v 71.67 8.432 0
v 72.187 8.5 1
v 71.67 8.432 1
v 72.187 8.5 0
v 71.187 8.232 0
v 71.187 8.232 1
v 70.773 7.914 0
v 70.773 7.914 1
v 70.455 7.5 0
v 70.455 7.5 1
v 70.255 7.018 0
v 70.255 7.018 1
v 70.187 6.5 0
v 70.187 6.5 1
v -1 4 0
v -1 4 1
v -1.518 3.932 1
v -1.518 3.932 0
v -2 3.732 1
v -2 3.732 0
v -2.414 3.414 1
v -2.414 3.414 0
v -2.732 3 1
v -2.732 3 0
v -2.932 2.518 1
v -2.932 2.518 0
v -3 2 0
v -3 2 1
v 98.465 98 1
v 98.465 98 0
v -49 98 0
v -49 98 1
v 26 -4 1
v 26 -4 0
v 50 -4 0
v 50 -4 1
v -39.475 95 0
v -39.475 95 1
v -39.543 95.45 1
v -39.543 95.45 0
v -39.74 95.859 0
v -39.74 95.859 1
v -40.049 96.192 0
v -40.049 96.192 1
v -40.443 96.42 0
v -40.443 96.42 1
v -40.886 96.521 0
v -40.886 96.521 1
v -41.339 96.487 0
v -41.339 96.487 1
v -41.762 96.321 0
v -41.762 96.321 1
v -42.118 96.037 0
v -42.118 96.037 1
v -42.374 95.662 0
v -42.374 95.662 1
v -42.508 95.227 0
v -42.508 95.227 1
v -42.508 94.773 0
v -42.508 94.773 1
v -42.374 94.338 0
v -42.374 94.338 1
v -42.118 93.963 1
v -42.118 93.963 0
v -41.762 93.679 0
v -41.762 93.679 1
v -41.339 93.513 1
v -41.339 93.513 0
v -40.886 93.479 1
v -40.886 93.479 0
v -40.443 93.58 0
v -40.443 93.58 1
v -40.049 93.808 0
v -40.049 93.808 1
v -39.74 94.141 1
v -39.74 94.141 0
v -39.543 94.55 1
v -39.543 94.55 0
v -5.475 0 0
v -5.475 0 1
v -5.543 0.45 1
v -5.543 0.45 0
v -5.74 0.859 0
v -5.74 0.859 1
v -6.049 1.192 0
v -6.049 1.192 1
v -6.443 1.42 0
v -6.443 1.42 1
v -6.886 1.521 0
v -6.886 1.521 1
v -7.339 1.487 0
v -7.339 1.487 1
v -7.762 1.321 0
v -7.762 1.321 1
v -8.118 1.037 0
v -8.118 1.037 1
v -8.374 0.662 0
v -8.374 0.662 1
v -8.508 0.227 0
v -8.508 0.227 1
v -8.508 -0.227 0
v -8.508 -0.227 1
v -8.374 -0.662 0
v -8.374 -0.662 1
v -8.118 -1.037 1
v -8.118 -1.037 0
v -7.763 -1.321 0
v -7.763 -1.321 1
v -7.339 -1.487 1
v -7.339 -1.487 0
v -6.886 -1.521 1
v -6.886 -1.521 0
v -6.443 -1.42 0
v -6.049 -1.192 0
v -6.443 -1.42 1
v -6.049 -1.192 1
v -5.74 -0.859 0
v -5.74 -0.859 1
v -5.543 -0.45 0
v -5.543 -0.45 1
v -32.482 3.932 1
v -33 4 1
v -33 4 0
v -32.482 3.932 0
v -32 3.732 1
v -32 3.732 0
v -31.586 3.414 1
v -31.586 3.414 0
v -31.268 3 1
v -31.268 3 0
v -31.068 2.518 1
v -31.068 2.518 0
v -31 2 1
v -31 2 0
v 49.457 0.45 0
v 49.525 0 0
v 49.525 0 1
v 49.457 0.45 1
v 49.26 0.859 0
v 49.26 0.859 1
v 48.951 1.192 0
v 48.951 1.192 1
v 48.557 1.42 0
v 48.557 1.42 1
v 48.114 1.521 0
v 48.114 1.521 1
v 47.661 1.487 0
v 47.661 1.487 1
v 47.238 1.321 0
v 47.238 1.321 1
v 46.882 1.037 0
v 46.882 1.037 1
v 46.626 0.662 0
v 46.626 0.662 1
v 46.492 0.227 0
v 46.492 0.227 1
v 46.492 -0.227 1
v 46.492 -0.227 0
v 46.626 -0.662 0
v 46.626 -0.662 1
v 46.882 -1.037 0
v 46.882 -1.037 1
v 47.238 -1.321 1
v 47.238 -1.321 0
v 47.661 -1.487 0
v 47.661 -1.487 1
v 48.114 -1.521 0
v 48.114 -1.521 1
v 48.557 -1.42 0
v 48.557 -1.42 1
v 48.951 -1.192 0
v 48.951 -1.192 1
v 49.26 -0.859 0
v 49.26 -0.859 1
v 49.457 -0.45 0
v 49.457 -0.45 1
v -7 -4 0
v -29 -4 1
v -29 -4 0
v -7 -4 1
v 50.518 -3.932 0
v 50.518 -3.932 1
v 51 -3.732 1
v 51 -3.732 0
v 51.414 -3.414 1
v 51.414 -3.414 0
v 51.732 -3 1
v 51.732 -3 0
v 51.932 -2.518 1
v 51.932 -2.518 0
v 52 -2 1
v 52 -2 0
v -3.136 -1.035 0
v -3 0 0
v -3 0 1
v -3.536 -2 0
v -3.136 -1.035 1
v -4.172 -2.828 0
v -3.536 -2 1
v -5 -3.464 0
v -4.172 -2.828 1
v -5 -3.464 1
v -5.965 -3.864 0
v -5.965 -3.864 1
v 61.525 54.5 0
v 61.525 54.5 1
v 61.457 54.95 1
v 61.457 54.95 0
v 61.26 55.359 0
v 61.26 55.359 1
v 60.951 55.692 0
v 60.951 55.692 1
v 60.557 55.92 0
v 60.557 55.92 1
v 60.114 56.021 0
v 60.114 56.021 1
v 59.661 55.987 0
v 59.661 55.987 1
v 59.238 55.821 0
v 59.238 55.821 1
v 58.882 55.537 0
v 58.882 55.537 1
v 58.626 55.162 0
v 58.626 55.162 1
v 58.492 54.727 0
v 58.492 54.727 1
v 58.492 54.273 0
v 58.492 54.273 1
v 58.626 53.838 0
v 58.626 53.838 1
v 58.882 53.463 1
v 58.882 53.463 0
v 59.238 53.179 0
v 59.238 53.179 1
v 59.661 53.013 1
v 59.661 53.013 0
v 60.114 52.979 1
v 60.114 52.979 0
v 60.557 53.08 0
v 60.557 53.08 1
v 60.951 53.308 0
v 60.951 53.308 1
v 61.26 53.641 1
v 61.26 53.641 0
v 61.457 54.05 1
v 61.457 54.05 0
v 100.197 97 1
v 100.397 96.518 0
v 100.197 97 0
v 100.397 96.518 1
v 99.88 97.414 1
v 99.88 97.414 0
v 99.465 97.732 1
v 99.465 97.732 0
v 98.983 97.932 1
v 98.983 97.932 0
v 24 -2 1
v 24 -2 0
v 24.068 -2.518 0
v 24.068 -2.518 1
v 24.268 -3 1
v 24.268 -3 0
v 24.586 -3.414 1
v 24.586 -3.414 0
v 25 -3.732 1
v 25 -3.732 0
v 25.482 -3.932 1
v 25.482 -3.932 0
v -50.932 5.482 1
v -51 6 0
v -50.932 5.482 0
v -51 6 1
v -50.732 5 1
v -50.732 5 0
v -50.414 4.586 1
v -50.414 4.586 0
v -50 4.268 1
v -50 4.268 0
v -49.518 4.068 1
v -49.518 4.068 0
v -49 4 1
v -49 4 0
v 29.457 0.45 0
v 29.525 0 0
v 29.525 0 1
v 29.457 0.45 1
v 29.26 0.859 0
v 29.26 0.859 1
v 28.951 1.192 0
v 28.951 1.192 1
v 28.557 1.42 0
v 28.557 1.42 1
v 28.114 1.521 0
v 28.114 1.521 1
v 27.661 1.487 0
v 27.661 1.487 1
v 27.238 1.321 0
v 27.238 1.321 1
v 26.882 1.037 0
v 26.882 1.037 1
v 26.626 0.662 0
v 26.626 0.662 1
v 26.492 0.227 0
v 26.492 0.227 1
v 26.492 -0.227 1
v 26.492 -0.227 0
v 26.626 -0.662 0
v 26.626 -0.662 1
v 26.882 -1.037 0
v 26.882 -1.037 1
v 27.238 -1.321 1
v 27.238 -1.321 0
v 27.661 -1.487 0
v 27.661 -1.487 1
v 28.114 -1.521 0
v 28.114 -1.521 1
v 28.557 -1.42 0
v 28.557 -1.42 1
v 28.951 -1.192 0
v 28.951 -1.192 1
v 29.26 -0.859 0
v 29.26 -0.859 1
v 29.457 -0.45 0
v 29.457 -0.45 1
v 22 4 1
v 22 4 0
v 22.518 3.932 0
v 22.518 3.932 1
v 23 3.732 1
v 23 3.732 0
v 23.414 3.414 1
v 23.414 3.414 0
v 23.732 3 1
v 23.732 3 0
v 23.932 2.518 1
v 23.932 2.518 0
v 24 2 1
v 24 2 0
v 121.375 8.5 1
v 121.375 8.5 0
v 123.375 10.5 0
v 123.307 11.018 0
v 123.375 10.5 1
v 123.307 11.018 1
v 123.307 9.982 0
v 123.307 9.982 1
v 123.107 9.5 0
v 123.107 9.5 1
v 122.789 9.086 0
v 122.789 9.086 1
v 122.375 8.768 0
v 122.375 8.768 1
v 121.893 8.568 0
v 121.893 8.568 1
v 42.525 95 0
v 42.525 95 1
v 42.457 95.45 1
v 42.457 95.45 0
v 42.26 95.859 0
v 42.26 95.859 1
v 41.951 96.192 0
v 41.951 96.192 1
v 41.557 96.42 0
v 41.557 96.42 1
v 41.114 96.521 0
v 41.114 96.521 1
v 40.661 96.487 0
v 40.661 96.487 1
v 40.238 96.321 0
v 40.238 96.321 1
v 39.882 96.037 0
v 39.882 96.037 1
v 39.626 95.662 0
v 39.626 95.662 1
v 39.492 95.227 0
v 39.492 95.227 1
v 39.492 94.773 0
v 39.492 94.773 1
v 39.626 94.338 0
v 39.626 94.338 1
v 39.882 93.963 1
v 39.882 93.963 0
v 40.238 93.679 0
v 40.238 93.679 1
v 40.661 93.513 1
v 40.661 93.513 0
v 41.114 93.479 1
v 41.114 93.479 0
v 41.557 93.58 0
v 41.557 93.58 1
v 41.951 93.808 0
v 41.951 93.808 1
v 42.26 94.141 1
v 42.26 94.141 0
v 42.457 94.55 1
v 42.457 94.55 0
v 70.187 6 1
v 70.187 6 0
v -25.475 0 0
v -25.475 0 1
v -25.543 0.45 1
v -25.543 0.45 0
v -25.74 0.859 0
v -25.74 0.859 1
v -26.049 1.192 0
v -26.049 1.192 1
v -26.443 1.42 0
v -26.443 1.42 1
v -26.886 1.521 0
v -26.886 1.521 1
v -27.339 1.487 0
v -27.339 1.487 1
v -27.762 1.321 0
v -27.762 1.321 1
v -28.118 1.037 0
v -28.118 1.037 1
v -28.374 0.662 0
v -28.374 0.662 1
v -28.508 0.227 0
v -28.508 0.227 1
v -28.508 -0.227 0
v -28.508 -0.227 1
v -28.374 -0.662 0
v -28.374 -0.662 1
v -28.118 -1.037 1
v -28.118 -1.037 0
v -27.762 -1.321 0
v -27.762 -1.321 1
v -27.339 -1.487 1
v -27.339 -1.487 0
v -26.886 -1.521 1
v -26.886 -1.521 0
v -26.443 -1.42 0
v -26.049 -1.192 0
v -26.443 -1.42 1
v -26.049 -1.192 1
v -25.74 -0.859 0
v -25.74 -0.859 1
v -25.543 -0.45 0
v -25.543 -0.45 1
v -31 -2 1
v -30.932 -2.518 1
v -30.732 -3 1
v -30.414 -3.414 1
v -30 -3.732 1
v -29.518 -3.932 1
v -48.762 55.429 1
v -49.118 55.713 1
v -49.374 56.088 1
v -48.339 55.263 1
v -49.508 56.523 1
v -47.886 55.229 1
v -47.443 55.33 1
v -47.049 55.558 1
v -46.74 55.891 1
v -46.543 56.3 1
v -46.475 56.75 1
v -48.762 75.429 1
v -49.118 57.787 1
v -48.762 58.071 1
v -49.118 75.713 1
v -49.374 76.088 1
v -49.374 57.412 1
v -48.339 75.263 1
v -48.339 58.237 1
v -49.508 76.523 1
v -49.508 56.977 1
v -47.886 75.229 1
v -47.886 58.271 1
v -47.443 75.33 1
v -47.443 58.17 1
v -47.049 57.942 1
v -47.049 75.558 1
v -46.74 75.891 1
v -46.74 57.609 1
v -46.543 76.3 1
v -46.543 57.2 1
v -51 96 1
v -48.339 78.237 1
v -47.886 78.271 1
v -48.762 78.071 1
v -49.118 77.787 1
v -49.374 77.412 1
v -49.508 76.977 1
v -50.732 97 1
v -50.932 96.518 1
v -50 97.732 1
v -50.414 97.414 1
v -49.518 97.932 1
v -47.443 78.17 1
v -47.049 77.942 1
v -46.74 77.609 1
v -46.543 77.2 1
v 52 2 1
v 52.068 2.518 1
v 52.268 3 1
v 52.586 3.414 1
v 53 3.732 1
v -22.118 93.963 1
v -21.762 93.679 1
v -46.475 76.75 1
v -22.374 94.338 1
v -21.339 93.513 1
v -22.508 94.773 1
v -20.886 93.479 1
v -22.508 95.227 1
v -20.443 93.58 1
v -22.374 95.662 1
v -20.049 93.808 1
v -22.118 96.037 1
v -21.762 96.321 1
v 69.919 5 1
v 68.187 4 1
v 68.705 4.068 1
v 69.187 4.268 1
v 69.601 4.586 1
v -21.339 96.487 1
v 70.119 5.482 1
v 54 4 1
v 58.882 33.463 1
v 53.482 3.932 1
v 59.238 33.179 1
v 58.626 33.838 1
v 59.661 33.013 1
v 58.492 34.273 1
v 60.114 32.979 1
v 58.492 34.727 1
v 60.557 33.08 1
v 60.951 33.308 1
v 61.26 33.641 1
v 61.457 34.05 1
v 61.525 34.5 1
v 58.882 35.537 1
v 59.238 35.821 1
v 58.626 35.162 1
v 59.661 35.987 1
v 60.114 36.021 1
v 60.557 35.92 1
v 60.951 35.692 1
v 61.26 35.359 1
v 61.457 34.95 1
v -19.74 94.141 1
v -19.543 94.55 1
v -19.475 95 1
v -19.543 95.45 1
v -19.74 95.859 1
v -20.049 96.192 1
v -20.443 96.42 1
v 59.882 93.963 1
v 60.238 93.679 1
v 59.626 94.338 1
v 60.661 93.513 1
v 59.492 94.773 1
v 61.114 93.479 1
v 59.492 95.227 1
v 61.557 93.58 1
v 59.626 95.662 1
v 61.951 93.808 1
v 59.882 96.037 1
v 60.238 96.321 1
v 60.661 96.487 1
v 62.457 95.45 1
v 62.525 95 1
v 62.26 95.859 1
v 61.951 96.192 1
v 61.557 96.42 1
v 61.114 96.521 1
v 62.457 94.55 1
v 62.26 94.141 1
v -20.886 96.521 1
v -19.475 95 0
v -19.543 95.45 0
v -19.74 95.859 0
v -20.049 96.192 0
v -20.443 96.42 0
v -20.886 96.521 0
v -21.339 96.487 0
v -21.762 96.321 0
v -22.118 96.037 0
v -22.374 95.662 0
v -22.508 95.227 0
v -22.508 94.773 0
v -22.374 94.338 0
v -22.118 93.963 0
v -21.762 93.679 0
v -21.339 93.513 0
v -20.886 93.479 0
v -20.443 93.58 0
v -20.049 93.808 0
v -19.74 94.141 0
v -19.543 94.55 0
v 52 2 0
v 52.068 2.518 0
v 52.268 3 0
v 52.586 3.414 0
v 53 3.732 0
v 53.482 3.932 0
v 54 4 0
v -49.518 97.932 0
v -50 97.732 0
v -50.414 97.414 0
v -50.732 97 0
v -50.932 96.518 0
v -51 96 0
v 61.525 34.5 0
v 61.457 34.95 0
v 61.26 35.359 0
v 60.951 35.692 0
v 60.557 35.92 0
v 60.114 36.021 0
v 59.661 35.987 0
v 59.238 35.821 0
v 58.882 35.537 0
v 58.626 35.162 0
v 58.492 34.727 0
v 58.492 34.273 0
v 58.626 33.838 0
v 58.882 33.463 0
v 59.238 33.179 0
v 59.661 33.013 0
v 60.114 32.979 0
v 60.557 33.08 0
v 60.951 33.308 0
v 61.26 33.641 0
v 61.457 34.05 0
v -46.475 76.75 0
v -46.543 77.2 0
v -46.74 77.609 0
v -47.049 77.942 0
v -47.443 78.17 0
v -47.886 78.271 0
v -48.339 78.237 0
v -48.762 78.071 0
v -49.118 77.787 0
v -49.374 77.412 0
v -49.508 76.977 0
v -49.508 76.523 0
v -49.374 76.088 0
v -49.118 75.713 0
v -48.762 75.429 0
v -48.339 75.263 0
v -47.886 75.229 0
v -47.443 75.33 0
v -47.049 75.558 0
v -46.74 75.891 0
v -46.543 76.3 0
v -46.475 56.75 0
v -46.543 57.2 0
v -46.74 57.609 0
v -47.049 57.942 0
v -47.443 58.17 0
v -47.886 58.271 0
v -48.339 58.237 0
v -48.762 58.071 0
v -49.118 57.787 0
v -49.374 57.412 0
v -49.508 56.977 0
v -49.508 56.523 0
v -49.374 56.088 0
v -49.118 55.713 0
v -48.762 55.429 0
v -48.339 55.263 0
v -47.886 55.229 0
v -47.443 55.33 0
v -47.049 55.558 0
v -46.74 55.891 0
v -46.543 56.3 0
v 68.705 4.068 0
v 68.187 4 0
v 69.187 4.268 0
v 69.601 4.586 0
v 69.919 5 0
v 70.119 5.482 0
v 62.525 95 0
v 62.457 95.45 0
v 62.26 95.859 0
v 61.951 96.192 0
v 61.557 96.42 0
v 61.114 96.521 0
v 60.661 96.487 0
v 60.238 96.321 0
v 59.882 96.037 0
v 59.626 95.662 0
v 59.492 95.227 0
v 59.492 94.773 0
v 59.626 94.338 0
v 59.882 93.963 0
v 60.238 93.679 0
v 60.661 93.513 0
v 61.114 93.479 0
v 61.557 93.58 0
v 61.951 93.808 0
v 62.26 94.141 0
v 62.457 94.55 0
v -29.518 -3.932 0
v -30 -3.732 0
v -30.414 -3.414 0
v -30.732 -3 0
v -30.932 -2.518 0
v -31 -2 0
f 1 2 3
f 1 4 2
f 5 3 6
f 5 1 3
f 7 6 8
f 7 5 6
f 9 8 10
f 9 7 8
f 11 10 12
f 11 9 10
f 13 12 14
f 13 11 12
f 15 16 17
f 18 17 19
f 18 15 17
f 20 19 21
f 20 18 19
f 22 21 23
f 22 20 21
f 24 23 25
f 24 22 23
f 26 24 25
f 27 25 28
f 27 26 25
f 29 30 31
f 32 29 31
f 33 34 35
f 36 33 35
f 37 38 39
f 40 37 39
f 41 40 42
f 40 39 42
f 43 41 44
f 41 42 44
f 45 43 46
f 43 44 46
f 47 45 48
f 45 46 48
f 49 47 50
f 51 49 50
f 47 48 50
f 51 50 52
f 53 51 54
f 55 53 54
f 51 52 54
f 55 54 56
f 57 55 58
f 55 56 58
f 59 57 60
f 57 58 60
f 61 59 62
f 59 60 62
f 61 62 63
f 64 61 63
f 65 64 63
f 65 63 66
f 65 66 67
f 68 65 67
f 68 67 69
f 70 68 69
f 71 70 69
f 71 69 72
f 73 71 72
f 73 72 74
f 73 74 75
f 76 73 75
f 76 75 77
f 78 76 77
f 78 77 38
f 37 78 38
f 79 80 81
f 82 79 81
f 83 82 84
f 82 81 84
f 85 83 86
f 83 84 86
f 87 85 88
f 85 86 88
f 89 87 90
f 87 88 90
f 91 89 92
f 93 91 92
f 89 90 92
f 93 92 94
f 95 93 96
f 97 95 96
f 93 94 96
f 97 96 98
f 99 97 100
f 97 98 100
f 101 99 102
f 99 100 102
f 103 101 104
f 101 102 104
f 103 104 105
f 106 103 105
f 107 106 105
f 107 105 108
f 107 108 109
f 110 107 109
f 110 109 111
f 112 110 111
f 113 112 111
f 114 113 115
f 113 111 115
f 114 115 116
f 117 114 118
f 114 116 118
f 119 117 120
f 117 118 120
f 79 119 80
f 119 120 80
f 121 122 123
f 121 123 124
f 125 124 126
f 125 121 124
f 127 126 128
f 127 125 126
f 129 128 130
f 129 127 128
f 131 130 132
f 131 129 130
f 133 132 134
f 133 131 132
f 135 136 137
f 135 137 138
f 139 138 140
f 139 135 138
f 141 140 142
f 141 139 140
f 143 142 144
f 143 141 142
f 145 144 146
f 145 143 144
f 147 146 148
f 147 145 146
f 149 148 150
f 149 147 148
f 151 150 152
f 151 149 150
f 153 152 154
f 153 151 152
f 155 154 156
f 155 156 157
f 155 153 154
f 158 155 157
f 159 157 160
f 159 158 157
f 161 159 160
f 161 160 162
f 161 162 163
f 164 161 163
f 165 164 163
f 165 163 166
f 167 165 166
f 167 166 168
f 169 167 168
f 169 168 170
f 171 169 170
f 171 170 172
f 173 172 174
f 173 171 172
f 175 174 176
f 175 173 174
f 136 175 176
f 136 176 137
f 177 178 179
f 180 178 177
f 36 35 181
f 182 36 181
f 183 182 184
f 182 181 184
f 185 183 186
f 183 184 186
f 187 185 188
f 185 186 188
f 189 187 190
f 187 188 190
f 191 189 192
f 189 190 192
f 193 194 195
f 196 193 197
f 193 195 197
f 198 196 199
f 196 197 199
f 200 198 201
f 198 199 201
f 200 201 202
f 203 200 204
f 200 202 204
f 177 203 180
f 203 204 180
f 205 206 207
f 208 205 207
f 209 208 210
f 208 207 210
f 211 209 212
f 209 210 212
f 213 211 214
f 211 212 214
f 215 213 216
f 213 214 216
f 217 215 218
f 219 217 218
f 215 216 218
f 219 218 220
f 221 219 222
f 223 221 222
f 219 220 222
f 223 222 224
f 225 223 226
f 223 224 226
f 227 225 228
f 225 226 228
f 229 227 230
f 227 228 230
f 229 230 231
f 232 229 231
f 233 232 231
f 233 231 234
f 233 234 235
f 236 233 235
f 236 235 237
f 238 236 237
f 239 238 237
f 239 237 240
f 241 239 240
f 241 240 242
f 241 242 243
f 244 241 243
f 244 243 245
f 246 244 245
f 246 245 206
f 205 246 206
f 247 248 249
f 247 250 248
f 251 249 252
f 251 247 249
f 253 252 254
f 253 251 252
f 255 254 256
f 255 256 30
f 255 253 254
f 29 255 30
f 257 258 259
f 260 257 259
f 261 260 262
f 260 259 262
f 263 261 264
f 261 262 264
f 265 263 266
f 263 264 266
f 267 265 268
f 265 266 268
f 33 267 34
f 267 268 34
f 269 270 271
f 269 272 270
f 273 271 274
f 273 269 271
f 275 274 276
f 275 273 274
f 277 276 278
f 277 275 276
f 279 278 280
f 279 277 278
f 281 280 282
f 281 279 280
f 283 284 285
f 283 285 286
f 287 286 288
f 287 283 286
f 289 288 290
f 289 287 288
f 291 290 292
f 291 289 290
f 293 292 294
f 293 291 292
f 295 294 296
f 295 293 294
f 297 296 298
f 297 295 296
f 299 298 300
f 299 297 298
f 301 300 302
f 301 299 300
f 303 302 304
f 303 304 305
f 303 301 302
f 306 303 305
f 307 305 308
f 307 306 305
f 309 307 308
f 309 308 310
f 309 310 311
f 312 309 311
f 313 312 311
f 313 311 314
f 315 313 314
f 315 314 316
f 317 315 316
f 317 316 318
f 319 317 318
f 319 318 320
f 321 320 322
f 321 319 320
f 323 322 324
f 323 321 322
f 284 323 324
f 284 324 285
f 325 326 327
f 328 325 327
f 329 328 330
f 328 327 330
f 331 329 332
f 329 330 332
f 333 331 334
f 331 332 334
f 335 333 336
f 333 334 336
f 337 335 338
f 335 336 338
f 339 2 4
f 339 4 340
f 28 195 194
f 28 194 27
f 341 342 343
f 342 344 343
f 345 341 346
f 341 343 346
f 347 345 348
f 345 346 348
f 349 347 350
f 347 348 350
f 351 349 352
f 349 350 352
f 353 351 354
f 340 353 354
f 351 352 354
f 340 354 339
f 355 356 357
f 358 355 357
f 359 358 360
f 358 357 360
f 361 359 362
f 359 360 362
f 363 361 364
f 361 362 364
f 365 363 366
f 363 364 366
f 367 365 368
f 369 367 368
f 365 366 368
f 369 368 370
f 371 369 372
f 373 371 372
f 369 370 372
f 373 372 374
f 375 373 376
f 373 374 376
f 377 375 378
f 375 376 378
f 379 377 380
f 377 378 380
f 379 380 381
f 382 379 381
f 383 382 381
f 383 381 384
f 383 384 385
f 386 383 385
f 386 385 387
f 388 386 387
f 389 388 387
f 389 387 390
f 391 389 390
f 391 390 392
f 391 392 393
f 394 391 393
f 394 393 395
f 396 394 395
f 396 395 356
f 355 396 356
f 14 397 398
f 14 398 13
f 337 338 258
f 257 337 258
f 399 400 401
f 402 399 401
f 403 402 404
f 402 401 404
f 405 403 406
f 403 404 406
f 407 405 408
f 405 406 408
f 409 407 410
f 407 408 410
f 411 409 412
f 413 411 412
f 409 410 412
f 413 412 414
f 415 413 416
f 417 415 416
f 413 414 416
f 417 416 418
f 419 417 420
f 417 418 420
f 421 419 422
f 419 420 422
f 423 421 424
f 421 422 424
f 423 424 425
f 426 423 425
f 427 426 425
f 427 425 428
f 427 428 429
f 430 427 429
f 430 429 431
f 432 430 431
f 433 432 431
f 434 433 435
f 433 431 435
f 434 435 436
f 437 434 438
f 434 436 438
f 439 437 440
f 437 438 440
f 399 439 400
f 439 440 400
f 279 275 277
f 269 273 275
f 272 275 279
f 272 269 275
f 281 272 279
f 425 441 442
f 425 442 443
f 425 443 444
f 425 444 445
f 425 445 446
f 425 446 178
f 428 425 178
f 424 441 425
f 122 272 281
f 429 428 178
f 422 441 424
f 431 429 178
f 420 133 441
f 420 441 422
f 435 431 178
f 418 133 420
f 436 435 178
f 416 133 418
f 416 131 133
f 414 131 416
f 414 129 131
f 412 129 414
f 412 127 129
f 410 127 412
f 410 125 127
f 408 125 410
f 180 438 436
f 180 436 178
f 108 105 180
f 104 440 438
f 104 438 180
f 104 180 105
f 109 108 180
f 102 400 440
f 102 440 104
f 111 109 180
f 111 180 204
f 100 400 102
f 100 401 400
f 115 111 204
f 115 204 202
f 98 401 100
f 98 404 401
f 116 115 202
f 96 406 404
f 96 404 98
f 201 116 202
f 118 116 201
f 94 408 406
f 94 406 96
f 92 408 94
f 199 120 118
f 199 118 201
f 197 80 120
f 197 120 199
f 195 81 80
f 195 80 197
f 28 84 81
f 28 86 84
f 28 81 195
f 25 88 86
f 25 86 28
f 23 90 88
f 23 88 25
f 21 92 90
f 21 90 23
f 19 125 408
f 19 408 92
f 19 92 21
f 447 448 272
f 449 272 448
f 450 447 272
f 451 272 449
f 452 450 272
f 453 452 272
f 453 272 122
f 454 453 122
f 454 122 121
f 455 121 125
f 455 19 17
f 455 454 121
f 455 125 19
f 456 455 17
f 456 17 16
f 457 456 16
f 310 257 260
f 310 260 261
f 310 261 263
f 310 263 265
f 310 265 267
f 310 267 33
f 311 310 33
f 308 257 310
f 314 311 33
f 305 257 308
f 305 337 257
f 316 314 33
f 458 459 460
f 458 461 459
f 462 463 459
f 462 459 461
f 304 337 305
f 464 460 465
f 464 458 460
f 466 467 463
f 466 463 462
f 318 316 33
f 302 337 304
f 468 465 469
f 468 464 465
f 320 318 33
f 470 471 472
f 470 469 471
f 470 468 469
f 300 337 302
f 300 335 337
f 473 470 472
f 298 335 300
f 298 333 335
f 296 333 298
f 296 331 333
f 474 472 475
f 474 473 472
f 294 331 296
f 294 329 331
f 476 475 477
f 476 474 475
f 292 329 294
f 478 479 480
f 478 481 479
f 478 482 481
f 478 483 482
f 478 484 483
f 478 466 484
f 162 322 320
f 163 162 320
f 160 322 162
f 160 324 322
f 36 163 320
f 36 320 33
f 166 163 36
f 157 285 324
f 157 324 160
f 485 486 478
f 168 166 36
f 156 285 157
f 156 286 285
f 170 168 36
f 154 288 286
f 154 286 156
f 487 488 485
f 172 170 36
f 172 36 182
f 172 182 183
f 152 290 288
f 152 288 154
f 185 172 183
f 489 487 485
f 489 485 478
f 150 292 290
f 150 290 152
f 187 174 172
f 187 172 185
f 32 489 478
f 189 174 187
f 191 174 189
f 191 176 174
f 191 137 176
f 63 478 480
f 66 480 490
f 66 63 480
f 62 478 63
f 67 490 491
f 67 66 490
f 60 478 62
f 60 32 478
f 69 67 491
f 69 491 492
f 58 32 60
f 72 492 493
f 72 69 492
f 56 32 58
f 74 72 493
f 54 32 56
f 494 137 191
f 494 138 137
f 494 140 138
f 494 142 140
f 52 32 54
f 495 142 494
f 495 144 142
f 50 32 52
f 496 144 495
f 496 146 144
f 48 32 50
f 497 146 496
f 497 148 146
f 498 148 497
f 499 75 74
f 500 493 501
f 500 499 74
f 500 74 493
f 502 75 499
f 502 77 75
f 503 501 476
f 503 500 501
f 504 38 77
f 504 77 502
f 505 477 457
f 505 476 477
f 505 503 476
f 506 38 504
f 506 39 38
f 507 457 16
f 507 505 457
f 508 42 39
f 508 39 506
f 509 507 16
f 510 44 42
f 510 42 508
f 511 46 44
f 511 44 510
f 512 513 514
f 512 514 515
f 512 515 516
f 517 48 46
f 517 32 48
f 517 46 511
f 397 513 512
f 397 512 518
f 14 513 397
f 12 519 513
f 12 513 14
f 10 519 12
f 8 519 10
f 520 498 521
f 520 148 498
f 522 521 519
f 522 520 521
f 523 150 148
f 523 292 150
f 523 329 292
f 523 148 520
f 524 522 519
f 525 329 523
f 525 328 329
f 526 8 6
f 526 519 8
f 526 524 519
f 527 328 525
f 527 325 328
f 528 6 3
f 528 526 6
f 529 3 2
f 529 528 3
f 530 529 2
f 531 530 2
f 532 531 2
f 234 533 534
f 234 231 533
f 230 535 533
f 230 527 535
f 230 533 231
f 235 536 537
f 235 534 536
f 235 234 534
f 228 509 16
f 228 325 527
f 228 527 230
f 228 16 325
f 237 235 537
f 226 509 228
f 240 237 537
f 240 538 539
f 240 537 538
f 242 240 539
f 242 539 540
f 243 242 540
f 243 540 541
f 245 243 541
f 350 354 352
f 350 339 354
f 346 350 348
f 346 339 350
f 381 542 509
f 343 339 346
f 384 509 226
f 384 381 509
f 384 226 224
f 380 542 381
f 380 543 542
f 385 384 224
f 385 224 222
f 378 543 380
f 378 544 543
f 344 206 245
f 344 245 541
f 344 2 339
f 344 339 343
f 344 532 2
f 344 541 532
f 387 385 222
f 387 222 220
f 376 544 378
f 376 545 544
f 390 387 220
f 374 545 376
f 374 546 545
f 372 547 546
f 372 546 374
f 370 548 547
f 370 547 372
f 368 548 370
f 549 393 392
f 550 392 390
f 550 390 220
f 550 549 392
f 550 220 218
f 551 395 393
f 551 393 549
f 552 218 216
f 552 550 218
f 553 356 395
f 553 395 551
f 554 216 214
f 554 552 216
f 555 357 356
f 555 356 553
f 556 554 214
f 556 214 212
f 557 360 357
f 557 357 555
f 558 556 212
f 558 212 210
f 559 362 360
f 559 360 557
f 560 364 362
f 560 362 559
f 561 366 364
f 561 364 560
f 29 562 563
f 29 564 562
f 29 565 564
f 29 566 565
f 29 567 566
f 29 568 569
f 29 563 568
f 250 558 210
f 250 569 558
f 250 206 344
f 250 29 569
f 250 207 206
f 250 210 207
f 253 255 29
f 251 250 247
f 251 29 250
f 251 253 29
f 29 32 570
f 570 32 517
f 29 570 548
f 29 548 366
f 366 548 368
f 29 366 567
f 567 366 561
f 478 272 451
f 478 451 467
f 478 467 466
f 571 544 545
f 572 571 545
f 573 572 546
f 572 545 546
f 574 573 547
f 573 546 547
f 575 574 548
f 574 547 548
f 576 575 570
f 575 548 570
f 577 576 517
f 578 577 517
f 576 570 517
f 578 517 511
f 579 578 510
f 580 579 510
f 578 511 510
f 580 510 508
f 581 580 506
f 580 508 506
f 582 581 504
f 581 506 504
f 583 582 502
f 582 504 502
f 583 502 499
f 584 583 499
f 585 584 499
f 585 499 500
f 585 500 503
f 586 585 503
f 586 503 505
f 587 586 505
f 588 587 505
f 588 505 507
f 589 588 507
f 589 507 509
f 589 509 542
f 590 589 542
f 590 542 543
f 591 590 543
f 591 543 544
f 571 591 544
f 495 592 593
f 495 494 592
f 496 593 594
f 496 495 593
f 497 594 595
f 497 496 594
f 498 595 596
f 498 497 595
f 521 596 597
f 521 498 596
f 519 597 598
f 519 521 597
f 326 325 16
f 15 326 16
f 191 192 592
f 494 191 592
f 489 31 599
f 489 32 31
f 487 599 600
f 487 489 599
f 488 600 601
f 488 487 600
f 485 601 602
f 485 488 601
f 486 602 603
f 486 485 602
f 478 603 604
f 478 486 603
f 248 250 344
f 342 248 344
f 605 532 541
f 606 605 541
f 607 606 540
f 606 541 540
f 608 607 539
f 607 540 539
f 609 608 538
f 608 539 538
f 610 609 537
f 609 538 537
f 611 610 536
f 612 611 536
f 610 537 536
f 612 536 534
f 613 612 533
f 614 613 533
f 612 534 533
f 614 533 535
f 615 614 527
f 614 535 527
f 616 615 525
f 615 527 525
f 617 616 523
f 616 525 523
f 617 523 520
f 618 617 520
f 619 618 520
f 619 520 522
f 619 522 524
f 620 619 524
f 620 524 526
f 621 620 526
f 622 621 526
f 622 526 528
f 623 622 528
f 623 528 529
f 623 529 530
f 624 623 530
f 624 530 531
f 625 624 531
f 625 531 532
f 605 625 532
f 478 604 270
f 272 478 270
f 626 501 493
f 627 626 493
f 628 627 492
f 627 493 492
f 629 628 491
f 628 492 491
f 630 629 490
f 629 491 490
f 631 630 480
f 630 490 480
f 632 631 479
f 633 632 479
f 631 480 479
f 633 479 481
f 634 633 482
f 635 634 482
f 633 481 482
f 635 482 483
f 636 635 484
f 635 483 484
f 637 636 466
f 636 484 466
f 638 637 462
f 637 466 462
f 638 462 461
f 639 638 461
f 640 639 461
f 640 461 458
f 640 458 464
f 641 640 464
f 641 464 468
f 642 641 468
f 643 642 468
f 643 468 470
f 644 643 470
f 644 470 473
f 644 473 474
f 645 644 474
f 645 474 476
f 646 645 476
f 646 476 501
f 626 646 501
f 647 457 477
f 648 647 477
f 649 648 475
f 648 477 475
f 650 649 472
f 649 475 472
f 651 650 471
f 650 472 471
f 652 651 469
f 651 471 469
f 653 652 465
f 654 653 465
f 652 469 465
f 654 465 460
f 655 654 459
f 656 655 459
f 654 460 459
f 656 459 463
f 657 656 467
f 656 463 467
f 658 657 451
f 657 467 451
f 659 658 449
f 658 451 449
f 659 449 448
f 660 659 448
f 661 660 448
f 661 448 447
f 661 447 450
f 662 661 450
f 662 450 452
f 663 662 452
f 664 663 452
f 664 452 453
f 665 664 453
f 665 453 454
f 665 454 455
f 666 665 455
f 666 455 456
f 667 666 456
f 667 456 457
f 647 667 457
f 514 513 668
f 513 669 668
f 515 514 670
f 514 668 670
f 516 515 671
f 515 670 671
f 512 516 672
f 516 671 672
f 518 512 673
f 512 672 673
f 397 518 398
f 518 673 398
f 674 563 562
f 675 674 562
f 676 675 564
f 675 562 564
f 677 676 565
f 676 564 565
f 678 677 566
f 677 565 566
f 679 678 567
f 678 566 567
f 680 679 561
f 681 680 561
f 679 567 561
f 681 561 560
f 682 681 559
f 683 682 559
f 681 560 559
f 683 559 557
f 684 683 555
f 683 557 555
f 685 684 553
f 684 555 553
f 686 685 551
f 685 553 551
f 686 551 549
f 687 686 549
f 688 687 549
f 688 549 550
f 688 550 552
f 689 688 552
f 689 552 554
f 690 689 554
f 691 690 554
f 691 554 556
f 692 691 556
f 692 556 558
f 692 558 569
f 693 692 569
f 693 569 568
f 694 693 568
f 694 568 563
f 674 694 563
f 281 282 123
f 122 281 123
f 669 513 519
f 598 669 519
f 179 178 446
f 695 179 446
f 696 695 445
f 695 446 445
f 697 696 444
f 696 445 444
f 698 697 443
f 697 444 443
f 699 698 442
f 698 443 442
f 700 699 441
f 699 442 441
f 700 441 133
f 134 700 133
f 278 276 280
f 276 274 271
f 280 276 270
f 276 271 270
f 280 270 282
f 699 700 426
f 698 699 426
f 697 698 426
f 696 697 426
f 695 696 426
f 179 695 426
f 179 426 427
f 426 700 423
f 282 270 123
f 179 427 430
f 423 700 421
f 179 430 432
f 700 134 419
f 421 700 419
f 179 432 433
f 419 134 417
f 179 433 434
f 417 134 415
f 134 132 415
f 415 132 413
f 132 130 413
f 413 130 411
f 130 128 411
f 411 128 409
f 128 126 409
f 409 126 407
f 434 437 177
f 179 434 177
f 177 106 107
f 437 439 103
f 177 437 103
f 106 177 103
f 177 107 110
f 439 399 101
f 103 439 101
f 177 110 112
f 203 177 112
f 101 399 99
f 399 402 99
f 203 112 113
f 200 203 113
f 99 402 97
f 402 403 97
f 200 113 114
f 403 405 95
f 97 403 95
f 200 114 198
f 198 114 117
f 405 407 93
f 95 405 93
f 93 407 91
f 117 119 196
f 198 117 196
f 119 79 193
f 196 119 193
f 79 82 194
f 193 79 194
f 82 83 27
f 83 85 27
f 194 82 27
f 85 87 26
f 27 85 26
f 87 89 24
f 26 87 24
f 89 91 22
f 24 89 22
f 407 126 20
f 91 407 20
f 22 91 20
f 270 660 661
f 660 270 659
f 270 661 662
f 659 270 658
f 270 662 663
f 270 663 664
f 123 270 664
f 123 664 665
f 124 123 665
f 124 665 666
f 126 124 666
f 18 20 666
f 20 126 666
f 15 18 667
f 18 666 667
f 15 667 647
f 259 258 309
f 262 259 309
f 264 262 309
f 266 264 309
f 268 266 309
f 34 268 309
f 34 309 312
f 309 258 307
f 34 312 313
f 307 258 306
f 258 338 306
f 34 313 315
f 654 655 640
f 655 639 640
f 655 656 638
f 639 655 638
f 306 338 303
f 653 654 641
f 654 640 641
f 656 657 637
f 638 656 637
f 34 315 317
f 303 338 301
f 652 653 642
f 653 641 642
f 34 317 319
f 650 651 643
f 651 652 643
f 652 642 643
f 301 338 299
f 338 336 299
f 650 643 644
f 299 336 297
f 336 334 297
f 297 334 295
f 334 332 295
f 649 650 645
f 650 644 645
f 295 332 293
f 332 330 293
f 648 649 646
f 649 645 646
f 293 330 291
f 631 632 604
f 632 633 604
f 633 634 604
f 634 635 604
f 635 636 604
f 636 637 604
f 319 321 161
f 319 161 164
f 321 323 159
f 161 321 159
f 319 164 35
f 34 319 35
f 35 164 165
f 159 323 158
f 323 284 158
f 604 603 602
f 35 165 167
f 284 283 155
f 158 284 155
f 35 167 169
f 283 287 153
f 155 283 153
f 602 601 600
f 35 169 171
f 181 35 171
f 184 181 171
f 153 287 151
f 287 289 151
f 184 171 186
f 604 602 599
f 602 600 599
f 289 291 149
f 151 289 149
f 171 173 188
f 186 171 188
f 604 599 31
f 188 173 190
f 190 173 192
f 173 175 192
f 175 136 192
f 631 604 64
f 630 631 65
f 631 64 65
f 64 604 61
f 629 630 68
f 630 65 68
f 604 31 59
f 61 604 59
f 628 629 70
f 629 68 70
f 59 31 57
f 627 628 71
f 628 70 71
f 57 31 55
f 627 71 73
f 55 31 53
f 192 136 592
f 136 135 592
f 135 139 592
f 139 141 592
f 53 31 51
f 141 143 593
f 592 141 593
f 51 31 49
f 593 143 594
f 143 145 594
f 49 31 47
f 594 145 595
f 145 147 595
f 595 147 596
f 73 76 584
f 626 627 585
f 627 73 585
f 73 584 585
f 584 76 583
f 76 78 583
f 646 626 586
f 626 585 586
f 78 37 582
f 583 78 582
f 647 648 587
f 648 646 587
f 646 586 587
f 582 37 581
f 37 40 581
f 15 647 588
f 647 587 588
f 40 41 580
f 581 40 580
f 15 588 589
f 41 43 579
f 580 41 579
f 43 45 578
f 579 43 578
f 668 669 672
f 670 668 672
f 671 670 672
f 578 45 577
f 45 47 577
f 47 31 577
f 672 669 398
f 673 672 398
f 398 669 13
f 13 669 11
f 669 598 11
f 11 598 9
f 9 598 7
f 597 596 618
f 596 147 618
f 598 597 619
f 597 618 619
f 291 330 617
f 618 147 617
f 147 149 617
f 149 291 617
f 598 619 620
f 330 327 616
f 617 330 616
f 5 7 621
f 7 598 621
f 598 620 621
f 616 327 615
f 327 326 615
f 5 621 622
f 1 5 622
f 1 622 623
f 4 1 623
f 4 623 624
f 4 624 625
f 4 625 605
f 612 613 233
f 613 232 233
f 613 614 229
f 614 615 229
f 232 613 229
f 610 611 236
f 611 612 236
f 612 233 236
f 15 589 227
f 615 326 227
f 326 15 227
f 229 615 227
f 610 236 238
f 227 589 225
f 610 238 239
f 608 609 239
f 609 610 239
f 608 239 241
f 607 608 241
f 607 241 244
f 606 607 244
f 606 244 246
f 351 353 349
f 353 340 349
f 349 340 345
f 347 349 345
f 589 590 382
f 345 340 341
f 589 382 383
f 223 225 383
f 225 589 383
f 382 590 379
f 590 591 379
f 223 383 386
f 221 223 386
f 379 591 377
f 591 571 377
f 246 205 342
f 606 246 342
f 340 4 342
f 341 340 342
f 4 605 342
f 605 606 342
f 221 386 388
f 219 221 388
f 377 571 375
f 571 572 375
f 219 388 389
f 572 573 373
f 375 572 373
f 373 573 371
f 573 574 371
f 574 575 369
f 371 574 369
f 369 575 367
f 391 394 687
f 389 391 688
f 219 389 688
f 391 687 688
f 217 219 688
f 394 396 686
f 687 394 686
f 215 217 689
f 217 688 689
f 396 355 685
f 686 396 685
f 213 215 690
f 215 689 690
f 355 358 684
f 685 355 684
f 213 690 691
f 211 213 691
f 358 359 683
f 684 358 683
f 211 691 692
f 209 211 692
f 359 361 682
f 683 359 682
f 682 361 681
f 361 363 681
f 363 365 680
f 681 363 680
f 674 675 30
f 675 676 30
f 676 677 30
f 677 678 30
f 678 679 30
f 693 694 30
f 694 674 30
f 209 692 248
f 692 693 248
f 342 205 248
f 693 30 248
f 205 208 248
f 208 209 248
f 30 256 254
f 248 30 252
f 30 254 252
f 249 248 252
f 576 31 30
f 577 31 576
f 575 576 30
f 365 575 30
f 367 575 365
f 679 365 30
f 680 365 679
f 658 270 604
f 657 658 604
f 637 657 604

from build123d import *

# Parameters (mm, degrees)
SKETCH_1_W                 = 28
SKETCH_1_H                 = 8
SKETCH_1_R                 = 1.525
EXTRUDE_1_DEPTH            = 1
SKETCH_3_R                 = 1.525
CUT_EXTRUDE_1_DEPTH        = 10
SKETCH_5_R                 = 1.525
CUT_EXTRUDE_3_DEPTH        = 10
SKETCH_6_R                 = 1.525
CUT_EXTRUDE_4_DEPTH        = 10
EXTRUDE_2_DEPTH            = 1
SKETCH_9_W                 = 55
SKETCH_9_H                 = 4.5
CUT_EXTRUDE_5_DEPTH        = 20.5
FILLET_1_R                 = 2
SKETCH_10_R                = 1.525
CUT_EXTRUDE_6_DEPTH        = 10
SKETCH_11_W                = 28
SKETCH_11_H                = 8
SKETCH_11_R                = 1.525
EXTRUDE_3_DEPTH            = 1
FILLET_2_R                 = 2
SKETCH_12_W                = 29
SKETCH_12_H                = 8
CUT_EXTRUDE_7_DEPTH        = 10
PATTERN_LINEAR_1_OUTLINE_R = 1.525
PATTERN_LINEAR_1_DEPTH     = 1
CUT_EXTRUDE_8_DEPTH        = 10
FILLET_3_R                 = 2
FILLET_4_R                 = 2


with BuildPart() as part:
    # 草图1 → 凸台-拉伸1 (new body)
    # profile 1 of 2: a face of its own
    with BuildSketch(Plane.XY):
        Polygon((-4, 4), (24, 4), (100, 4), (100, 98), (-51, 98), (-51, 4), align=None)
    # profile 2 of 2: a face of its own
    with BuildSketch(Plane.XY):
        with Locations((10, 0)):
            Rectangle(SKETCH_1_W, SKETCH_1_H)
        with Locations((20, 0)):
            Circle(SKETCH_1_R, mode=Mode.SUBTRACT)
        Circle(SKETCH_1_R, mode=Mode.SUBTRACT)
    extrude(amount=EXTRUDE_1_DEPTH)

    # 草图3 → 切除-拉伸1 (cut)
    with BuildSketch(Plane.XY.offset(1)):
        with Locations((-48, 76.75)):
            Circle(SKETCH_3_R)
        with Locations((-48, 56.75)):
            Circle(SKETCH_3_R)
    extrude(amount=-CUT_EXTRUDE_1_DEPTH, mode=Mode.SUBTRACT)

    # 草图5 → 切除-拉伸3 (cut)
    with BuildSketch(Plane.XY.offset(1)):
        with Locations((-41, 95)):
            Circle(SKETCH_5_R)
        with Locations((-21, 95)):
            Circle(SKETCH_5_R)
    extrude(amount=-CUT_EXTRUDE_3_DEPTH, mode=Mode.SUBTRACT)

    # 草图6 → 切除-拉伸4 (cut)
    with BuildSketch(Plane.XY.offset(1)):
        with Locations((41, 95)):
            Circle(SKETCH_6_R)
        with Locations((61, 95)):
            Circle(SKETCH_6_R)
    extrude(amount=-CUT_EXTRUDE_4_DEPTH, mode=Mode.SUBTRACT)

    # 草图7 → 凸台-拉伸2 (add)
    with BuildSketch(Plane.XY.offset(1)):
        Polygon((100, 98), (125.187224089, 4), (100, 4), align=None)
    extrude(amount=-EXTRUDE_2_DEPTH)

    # 草图9 → 切除-拉伸5 (cut)
    with BuildSketch(Plane.XY.offset(1)):
        with Locations((97.687224089, 6.25)):
            Rectangle(SKETCH_9_W, SKETCH_9_H)
    extrude(amount=-CUT_EXTRUDE_5_DEPTH, mode=Mode.SUBTRACT)

    # 圆角1
    fillet_1_edges = [part.edges().sort_by_distance(p)[0] for p in [
        (24, 4, 0.5),
        (24, -4, 0.5),
        (-4, -4, 0.5),
        (-4, 4, 0.5),
        (-51, 4, 0.5),
        (-51, 98, 0.5),
        (100, 98, 0.5),
        (123.981452723, 8.5, 0.5),
        (70.187224089, 4, 0.5),
        (70.187224089, 8.5, 0.5),
    ]]
    fillet(fillet_1_edges, radius=FILLET_1_R)

    # 草图10 → 切除-拉伸6 (cut)
    with BuildSketch(Plane.XY.offset(1)):
        with Locations((60, 34.5)):
            Circle(SKETCH_10_R)
        with Locations((60, 54.5)):
            Circle(SKETCH_10_R)
    extrude(amount=-CUT_EXTRUDE_6_DEPTH, mode=Mode.SUBTRACT)

    # 草图11 → 凸台-拉伸3 (add)
    with BuildSketch(Plane.XY.offset(1)):
        with Locations((-17, 0)):
            Rectangle(SKETCH_11_W, SKETCH_11_H)
        with Locations((-27, 0)):
            Circle(SKETCH_11_R, mode=Mode.SUBTRACT)
        with Locations((-7, 0)):
            Circle(SKETCH_11_R, mode=Mode.SUBTRACT)
    extrude(amount=-EXTRUDE_3_DEPTH)

    # 圆角2
    # the kernel refuses this fillet: 2 mm, written as the material it adds along each edge
    with BuildSketch(Plane(origin=(-31, 4, 1), x_dir=(-1, 0, 0), z_dir=(0, 0, -1))) as fillet_2_piece_1:
        with BuildLine():
            CenterArc((FILLET_2_R, -FILLET_2_R), FILLET_2_R, 90, 90)
            Line((0, -FILLET_2_R), (0, 0))
            Line((0, 0), (FILLET_2_R, 0))
        make_face()
    extrude(amount=1)
    # the kernel refuses this fillet: 2 mm, written as the material it takes off along each edge
    with BuildSketch(Plane(origin=(-3, -4, 3.5), x_dir=(-1, 0, 0), z_dir=(0, 0, -1))) as fillet_2_2_piece_1:
        with BuildLine():
            CenterArc((1, 2), FILLET_2_R, 240, 30)
            Line((0, 0.267949192), (0, 0))
            Line((0, 0), (1, 0))
        make_face()
    extrude(amount=6, mode=Mode.SUBTRACT)
    with BuildSketch(Plane(origin=(-31, -4, 6), x_dir=(0, 1, 0), z_dir=(0, 0, -1))) as fillet_2_2_piece_2:
        with BuildLine():
            CenterArc((FILLET_2_R, FILLET_2_R), FILLET_2_R, 180, 90)
            Line((0, FILLET_2_R), (0, 0))
            Line((0, 0), (FILLET_2_R, 0))
        make_face()
    extrude(amount=11, mode=Mode.SUBTRACT)

    # 草图12 → 切除-拉伸7 (cut)
    with BuildSketch(Plane.XY.offset(1)):
        with Locations((11.5, 0)):
            Rectangle(SKETCH_12_W, SKETCH_12_H)
    extrude(amount=-CUT_EXTRUDE_7_DEPTH, mode=Mode.SUBTRACT)

    # 阵列(线性)1: read off the stored shape, not the designer's step
    # 阵列(线性)1 outline → 阵列(线性)1 (add)
    with BuildSketch(Plane.XY):
        with BuildLine():
            ThreePointArc((24, -2), (24.585786438, -3.414213562), (26, -4))
            Line((26, -4), (50, -4))
            ThreePointArc((50, -4), (51.414213562, -3.414213562), (52, -2))
            Line((52, -2), (52, 4))
            Line((52, 4), (22, 4))
            ThreePointArc((22, 4), (23.414213562, 3.414213562), (24, 2))
            Line((24, 2), (24, -2))
        make_face()
        with Locations((28, 0)):
            Circle(PATTERN_LINEAR_1_OUTLINE_R, mode=Mode.SUBTRACT)
        with Locations((48, 0)):
            Circle(PATTERN_LINEAR_1_OUTLINE_R, mode=Mode.SUBTRACT)
    extrude(amount=PATTERN_LINEAR_1_DEPTH)

    # 草图13 → 切除-拉伸8 (cut)
    with BuildSketch(Plane.XY.offset(1)):
        with BuildLine():
            ThreePointArc((-3, 0), (-4.171572875, -2.828427125), (-7, -4))
            Line((-7, -4), (-4, -4))
            ThreePointArc((-4, -4), (-3.48236191, -3.931851653), (-3, -3.732050808))
            Line((-3, -3.732050808), (-3, 0))
        make_face()
    extrude(amount=-CUT_EXTRUDE_8_DEPTH, mode=Mode.SUBTRACT)

    # 圆角3
    fillet_3_edges = [part.edges().sort_by_distance(p)[0] for p in [
        (-3, 4, 0.5),
    ]]
    fillet(fillet_3_edges, radius=FILLET_3_R)

    # 圆角4
    fillet_4_edges = [part.edges().sort_by_distance(p)[0] for p in [
        (52, 4, 0.5),
    ]]
    fillet(fillet_4_edges, radius=FILLET_4_R)


solid = part.part
